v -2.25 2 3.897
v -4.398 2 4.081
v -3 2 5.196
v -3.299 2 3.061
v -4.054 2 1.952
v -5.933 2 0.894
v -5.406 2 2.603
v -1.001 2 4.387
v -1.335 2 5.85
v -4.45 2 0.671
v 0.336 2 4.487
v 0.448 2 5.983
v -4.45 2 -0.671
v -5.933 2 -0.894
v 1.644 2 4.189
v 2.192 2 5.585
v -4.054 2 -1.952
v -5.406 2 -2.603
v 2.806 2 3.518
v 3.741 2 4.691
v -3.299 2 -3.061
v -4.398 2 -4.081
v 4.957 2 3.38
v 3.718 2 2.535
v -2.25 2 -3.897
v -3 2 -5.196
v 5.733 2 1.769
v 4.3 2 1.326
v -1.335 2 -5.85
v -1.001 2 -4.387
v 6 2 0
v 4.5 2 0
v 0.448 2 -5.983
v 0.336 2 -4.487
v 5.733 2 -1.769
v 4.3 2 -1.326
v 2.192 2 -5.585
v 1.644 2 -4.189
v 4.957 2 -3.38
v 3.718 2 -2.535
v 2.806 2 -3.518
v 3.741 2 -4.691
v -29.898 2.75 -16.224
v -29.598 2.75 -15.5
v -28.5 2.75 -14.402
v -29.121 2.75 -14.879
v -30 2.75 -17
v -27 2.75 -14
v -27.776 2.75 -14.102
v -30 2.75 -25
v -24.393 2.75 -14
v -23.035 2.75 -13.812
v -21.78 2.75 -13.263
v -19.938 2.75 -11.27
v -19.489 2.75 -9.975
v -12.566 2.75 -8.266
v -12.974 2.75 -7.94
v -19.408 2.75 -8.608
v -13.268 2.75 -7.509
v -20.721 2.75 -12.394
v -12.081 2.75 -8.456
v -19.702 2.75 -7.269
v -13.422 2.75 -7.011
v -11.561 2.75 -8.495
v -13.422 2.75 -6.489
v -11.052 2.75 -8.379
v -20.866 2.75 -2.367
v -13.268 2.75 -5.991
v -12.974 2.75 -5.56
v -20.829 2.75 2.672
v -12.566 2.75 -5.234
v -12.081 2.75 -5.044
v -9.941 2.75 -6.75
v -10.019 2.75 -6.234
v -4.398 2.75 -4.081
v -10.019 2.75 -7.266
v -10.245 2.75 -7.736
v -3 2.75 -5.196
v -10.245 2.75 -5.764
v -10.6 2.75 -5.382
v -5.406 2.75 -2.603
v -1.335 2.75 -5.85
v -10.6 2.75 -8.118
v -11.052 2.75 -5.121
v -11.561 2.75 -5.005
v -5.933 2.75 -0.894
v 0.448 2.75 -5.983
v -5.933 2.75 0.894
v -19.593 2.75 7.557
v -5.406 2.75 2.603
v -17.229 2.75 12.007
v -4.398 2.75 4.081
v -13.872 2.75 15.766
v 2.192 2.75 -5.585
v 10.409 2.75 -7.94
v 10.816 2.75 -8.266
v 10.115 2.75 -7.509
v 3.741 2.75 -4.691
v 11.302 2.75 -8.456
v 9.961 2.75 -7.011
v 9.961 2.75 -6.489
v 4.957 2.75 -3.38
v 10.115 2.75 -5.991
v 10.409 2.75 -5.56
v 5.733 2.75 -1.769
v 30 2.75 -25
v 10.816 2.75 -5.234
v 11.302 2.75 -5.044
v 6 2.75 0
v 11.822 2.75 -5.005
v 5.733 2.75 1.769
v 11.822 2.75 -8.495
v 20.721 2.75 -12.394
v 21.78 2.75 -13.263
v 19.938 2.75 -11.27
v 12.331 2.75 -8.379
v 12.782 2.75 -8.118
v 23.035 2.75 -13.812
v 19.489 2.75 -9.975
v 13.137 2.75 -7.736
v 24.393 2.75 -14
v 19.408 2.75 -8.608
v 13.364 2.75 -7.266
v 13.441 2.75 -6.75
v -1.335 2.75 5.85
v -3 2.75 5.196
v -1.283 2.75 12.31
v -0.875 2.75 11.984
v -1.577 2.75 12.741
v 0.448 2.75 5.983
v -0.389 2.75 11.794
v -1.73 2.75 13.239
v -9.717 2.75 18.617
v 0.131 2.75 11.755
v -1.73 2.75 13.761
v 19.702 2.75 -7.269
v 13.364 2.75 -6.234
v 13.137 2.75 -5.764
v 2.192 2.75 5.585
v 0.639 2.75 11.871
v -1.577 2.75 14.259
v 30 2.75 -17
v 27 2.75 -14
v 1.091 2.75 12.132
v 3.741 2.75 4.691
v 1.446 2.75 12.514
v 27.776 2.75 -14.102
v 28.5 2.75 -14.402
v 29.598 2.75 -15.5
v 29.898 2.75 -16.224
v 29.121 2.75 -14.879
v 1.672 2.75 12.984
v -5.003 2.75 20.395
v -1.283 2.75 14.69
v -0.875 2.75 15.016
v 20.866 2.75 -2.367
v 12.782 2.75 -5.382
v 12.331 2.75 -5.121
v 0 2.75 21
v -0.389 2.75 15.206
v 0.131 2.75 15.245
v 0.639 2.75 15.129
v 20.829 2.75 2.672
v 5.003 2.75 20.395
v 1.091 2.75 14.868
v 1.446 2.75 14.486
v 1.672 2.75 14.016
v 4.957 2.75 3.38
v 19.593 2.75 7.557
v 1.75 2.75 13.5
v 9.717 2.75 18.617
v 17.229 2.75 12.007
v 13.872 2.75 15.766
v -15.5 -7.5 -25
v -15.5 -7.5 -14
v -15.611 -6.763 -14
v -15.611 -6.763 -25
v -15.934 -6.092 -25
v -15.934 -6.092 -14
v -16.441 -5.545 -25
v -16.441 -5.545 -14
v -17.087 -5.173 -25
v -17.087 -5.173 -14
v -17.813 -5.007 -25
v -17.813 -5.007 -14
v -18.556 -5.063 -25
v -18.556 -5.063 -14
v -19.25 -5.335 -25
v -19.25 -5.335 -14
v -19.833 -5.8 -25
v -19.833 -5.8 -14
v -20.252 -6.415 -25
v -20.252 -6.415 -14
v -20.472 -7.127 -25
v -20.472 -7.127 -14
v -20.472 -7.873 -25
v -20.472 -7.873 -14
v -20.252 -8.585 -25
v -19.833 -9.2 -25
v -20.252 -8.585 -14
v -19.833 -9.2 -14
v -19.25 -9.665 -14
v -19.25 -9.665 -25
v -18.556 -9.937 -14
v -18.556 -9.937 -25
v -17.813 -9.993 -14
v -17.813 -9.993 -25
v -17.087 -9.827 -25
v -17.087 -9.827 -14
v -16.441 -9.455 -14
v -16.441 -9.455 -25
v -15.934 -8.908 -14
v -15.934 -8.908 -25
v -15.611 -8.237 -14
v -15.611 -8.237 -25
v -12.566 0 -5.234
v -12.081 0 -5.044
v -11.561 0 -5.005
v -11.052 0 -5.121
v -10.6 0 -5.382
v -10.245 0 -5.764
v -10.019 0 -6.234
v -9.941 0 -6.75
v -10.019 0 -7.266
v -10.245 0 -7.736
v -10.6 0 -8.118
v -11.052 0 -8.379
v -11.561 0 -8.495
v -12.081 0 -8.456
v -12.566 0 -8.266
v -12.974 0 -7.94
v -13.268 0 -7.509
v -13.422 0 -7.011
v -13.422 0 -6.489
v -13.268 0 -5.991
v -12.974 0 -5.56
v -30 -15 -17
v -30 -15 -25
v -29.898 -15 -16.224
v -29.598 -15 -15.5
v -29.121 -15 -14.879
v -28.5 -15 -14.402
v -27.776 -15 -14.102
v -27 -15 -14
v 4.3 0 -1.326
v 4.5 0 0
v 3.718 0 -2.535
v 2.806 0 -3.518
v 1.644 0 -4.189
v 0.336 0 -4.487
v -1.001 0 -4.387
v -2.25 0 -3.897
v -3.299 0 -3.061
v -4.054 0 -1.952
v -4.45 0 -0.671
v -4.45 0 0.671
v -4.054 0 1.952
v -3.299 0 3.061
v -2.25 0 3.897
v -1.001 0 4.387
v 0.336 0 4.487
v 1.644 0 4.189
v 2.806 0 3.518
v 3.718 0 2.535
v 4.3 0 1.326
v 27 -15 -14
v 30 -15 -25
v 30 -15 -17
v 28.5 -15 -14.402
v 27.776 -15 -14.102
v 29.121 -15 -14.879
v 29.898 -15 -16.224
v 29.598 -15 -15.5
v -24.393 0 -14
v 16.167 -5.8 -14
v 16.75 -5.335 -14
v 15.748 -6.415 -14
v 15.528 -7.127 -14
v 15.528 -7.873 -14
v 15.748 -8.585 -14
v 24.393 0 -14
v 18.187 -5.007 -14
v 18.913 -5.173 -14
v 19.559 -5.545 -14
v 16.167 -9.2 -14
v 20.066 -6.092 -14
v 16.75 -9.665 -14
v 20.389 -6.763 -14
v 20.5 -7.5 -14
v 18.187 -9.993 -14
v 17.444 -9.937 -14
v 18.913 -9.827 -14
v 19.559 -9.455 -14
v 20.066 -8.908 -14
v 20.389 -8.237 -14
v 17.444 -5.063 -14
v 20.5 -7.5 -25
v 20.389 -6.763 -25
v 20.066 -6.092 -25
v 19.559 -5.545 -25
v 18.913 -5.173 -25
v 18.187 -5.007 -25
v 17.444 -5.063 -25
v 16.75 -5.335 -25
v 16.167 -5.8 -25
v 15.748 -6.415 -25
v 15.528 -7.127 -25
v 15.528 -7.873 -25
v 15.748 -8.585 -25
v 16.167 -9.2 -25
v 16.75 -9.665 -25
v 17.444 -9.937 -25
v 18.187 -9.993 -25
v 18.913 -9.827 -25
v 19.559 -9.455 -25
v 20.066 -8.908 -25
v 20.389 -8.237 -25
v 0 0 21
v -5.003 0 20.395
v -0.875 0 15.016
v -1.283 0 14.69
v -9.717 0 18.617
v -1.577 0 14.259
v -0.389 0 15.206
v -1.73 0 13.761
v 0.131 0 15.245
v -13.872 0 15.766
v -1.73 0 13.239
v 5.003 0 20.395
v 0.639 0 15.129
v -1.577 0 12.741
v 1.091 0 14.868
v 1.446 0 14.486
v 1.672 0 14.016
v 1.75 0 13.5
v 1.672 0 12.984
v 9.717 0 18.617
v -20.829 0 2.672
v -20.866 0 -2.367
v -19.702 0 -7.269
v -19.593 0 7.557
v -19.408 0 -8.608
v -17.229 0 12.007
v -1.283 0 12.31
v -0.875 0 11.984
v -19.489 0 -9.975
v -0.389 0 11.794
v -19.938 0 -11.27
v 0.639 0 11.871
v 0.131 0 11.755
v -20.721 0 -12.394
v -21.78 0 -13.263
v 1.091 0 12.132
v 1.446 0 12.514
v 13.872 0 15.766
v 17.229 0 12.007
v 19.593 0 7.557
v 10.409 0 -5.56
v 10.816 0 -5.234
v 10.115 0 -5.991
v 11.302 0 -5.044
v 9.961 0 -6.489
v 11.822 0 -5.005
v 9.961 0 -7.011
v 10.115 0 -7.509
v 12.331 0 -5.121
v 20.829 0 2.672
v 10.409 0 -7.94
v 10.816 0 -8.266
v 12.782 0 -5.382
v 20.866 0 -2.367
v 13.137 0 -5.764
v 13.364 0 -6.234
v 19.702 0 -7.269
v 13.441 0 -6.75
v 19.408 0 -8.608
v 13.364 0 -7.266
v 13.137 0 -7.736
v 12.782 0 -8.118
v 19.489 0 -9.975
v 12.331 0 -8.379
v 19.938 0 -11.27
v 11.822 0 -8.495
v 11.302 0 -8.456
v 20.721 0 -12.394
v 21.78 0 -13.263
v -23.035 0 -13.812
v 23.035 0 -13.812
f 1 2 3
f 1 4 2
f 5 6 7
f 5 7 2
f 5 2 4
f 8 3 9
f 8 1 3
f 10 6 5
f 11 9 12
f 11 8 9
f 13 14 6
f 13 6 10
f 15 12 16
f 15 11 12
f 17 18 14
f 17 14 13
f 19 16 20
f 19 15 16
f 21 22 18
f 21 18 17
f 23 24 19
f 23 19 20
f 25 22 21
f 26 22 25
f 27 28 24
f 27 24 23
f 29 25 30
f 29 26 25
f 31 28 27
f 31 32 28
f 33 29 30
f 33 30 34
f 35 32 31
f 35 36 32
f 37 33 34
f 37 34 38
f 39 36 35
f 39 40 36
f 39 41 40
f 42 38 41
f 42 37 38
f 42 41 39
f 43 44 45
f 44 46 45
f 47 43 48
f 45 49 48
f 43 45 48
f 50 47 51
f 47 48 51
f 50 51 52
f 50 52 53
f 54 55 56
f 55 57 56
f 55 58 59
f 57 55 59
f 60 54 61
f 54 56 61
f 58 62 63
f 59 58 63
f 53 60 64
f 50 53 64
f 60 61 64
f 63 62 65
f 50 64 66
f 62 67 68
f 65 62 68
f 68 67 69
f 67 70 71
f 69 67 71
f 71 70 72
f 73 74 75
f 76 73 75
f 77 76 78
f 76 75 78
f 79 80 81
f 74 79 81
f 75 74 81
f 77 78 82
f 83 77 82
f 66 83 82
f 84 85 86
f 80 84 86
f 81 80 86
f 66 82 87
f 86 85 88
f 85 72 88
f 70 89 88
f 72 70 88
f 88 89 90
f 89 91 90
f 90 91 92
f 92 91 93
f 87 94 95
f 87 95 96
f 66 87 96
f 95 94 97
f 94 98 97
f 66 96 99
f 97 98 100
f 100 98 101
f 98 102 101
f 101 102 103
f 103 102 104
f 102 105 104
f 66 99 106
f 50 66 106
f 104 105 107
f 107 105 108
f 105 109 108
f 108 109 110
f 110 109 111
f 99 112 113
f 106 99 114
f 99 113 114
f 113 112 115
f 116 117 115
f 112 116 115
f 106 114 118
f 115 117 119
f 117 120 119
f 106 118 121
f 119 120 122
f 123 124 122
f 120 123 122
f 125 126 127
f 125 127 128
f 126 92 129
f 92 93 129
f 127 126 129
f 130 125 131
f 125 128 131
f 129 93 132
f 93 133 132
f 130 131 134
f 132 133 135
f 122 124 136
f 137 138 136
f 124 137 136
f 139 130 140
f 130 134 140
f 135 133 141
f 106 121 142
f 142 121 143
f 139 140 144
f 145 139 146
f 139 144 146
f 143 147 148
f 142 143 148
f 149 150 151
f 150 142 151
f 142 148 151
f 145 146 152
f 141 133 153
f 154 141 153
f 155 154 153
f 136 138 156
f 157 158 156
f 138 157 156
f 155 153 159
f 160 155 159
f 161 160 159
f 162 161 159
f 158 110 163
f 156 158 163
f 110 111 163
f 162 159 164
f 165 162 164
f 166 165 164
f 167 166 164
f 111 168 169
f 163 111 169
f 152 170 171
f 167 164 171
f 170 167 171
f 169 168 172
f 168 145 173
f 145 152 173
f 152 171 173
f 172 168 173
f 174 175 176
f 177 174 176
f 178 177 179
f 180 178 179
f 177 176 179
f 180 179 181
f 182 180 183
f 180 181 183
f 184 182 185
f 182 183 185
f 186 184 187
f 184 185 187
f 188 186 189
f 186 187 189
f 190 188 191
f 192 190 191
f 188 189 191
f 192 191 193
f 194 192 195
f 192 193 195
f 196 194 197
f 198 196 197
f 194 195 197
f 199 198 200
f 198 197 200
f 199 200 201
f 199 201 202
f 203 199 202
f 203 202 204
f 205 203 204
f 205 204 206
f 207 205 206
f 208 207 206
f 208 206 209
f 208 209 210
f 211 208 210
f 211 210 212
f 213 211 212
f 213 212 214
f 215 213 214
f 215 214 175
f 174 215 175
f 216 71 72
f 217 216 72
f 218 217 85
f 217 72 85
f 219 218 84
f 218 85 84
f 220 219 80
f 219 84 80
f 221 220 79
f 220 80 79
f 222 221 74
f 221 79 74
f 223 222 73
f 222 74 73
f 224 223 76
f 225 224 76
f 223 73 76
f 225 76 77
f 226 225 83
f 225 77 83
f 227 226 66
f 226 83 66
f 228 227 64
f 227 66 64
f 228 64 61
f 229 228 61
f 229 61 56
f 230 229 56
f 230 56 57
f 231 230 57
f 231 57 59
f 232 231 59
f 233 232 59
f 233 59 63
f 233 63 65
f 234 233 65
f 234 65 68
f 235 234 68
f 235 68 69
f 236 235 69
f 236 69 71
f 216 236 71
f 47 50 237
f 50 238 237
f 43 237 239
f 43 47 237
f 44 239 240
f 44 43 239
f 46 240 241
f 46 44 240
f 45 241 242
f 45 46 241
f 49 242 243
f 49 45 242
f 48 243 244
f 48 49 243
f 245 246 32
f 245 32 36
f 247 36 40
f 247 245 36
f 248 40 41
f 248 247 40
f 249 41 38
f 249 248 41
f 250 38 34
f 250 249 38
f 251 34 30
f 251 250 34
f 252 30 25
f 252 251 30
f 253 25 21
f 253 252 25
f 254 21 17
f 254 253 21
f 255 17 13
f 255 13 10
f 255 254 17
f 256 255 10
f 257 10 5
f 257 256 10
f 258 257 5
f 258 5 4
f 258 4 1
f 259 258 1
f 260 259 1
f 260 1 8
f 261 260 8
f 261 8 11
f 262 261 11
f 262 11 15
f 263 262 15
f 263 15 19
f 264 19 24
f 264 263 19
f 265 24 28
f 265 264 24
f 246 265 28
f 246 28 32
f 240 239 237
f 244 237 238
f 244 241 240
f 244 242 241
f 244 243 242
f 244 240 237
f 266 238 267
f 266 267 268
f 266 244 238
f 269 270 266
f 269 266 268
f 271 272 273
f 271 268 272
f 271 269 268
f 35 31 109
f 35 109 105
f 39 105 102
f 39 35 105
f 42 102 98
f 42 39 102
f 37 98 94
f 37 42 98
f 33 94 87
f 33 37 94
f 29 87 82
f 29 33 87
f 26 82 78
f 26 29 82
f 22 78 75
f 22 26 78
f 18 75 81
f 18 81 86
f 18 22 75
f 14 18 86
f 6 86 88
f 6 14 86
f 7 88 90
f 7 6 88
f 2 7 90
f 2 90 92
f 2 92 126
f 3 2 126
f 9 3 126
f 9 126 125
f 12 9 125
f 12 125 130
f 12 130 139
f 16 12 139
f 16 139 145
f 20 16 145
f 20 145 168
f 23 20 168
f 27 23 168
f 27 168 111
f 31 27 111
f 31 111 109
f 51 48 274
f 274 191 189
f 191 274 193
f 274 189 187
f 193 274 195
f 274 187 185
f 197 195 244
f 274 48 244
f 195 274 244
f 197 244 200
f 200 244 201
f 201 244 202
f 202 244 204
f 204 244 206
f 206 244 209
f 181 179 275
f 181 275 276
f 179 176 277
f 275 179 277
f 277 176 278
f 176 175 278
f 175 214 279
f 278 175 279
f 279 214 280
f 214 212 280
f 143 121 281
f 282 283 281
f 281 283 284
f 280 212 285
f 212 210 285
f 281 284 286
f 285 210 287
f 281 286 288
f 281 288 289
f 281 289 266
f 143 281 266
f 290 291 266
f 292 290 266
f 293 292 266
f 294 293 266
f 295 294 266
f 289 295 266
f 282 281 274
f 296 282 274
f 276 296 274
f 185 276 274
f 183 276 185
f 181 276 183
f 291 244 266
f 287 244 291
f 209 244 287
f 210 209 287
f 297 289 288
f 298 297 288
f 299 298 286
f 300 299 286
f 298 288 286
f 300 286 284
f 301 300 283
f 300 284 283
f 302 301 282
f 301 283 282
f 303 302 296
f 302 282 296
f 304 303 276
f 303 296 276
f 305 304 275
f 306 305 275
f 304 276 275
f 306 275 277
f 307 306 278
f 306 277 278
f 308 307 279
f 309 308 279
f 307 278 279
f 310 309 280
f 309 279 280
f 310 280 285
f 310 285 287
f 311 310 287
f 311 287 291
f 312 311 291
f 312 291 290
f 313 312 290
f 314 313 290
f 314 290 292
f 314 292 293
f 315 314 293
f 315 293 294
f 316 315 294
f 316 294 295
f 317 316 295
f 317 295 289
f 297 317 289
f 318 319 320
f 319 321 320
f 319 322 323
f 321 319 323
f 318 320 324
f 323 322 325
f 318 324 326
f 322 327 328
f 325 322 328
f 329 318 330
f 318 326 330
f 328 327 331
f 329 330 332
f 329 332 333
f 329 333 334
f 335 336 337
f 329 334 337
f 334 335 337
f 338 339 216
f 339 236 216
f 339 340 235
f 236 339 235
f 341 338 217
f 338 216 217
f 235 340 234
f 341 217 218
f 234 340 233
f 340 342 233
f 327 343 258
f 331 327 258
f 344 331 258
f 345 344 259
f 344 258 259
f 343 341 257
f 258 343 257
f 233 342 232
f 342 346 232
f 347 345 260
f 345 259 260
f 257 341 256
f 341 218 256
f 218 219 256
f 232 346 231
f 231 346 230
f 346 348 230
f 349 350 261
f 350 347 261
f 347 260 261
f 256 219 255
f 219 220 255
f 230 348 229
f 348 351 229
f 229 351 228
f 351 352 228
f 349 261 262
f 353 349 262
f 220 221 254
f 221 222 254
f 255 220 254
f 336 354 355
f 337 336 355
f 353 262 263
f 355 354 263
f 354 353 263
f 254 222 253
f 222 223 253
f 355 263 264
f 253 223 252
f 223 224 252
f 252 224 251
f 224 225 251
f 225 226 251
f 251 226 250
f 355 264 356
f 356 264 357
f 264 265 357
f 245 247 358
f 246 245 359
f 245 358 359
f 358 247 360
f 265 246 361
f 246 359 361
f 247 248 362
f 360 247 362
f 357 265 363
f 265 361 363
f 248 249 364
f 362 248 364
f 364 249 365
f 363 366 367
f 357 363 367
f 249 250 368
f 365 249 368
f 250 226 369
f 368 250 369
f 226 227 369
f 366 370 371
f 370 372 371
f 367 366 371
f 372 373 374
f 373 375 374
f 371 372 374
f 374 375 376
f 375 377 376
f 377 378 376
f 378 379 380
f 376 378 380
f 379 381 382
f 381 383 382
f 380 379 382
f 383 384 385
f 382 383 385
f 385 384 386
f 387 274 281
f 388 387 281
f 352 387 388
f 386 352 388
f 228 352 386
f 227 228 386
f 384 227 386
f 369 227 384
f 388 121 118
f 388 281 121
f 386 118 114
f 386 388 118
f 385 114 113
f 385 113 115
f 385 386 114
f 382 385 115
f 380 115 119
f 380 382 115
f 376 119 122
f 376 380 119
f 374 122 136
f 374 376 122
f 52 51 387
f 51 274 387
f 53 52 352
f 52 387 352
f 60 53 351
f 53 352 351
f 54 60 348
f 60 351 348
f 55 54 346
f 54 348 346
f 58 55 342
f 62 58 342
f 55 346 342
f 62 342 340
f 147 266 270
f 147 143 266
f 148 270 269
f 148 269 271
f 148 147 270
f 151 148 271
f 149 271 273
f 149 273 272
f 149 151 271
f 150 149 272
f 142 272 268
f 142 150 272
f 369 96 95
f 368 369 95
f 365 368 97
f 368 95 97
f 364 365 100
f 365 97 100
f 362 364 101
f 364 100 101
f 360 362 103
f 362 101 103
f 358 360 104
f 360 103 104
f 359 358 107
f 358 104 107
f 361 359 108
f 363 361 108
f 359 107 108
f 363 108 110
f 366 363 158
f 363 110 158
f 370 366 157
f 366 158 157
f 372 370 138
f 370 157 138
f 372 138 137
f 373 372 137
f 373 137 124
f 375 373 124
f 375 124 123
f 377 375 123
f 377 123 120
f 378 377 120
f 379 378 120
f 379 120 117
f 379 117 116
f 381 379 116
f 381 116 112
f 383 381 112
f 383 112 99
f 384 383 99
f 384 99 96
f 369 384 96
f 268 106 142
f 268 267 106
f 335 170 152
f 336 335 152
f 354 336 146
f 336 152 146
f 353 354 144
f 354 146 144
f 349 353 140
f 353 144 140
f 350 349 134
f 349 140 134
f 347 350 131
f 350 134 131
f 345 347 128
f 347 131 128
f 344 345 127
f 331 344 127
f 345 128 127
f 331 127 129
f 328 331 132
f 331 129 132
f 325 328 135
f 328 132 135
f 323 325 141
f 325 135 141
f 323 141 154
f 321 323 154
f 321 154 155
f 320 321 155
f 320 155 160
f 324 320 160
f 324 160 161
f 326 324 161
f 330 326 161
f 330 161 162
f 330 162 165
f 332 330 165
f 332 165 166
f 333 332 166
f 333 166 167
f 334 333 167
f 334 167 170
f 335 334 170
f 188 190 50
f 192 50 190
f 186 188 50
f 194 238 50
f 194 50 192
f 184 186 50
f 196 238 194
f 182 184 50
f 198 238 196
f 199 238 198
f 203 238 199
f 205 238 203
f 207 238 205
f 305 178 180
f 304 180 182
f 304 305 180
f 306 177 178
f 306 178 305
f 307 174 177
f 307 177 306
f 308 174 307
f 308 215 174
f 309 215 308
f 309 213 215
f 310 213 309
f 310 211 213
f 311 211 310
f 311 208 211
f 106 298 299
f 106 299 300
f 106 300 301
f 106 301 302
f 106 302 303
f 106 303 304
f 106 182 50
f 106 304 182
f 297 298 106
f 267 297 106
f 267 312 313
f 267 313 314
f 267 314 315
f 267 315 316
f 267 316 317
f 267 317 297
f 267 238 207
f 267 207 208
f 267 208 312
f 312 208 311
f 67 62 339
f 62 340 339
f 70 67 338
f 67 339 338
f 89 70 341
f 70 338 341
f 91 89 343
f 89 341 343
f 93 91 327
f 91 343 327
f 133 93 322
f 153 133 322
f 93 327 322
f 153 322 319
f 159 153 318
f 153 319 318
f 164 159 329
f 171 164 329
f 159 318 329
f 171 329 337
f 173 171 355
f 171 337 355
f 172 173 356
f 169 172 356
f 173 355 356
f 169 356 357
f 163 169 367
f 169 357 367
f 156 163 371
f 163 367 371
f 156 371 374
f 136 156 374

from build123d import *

# Parameters (mm, degrees)
SKETCH1_R                = 6
SKETCH1_R_2              = 4.5
BOSS_EXTRUDE1_DEPTH      = 2
SKETCH1_5_R              = 21
SKETCH1_5_R_2            = 6
BOSS_EXTRUDE3_DEPTH      = 2.75
SKETCH2_R                = 1.75
CUT_EXTRUDE1_DEPTH       = 4.5
CIRPATTERN1_COUNT        = 3
SKETCH9_W                = 60
SKETCH9_H                = 11
BOSS_EXTRUDE7_DEPTH      = 15
BOSS_EXTRUDE7_DEPTH_BACK = 2.75
CUT_EXTRUDE3_REACH       = 13
SKETCH10_R               = 2.5
FILLET4_R                = 3
FILLET5_R                = 5


with BuildPart() as part:
    # Sketch1 → Boss-Extrude1 (new body)
    with BuildSketch(Plane(origin=(0, 0, 0), x_dir=(1, 0, 0), z_dir=(0, 1, 0))):
        Circle(SKETCH1_R)
        Circle(SKETCH1_R_2, mode=Mode.SUBTRACT)
    extrude(amount=BOSS_EXTRUDE1_DEPTH)

    # Sketch1<5> → Boss-Extrude3 (add)
    with BuildSketch(Plane(origin=(0, 0, 0), x_dir=(1, 0, 0), z_dir=(0, 1, 0))):
        Circle(SKETCH1_5_R)
        Circle(SKETCH1_5_R_2, mode=Mode.SUBTRACT)
    extrude(amount=BOSS_EXTRUDE3_DEPTH)

    # Sketch2 → Cut-Extrude1 (cut)
    with BuildSketch(Plane(origin=(0, 2.75, 0), x_dir=(1, 0, 0), z_dir=(0, 1, 0))):
        with Locations((0, -13.5)):
            Circle(SKETCH2_R)
    cut_extrude1 = extrude(amount=-CUT_EXTRUDE1_DEPTH, mode=Mode.SUBTRACT)

    # CirPattern1: Cut-Extrude1 ×3 about axis
    cirpattern1_axis = Axis((0, 0, 0), (0, 1, 0))
    for i in range(1, CIRPATTERN1_COUNT):
        add(cut_extrude1.rotate(cirpattern1_axis, i * 360 / CIRPATTERN1_COUNT), mode=Mode.SUBTRACT)

    # Sketch9 → Boss-Extrude7 (add, two sides)
    with BuildSketch(Plane.XZ) as boss_extrude7_sk:
        with Locations((0, -19.5)):
            Rectangle(SKETCH9_W, SKETCH9_H)
    extrude(amount=BOSS_EXTRUDE7_DEPTH)
    extrude(boss_extrude7_sk.sketch, amount=-BOSS_EXTRUDE7_DEPTH_BACK)

    # Sketch10 → Cut-Extrude3 (cut, up to next)
    with BuildSketch(Plane.XY.offset(-14), mode=Mode.PRIVATE) as cut_extrude3_sk1:
        with Locations((-18, -7.5)):
            Circle(SKETCH10_R)
    cut_extrude3_tool1 = extrude(cut_extrude3_sk1.sketch, amount=-CUT_EXTRUDE3_REACH, mode=Mode.PRIVATE) & part.part
    add(cut_extrude3_tool1.solids().sort_by_distance((-18, -7.5, -14))[0], mode=Mode.SUBTRACT)
    # Sketch10 → Cut-Extrude3 (cut, up to next)
    with BuildSketch(Plane.XY.offset(-14), mode=Mode.PRIVATE) as cut_extrude3_sk2:
        with Locations((18, -7.5)):
            Circle(SKETCH10_R)
    cut_extrude3_tool2 = extrude(cut_extrude3_sk2.sketch, amount=-CUT_EXTRUDE3_REACH, mode=Mode.PRIVATE) & part.part
    add(cut_extrude3_tool2.solids().sort_by_distance((18, -7.5, -14))[0], mode=Mode.SUBTRACT)

    # Fillet4
    fillet4_edges = [part.edges().sort_by_distance(p)[0] for p in [
        (-30, -6.125, -14),
        (30, -6.125, -14),
    ]]
    fillet(fillet4_edges, radius=FILLET4_R)

    # Fillet5
    fillet5_edges = [part.edges().sort_by_distance(p)[0] for p in [
        (-15.652475842, 1.375, -14),
        (15.652475842, 1.375, -14),
    ]]
    fillet(fillet5_edges, radius=FILLET5_R)


solid = part.part
